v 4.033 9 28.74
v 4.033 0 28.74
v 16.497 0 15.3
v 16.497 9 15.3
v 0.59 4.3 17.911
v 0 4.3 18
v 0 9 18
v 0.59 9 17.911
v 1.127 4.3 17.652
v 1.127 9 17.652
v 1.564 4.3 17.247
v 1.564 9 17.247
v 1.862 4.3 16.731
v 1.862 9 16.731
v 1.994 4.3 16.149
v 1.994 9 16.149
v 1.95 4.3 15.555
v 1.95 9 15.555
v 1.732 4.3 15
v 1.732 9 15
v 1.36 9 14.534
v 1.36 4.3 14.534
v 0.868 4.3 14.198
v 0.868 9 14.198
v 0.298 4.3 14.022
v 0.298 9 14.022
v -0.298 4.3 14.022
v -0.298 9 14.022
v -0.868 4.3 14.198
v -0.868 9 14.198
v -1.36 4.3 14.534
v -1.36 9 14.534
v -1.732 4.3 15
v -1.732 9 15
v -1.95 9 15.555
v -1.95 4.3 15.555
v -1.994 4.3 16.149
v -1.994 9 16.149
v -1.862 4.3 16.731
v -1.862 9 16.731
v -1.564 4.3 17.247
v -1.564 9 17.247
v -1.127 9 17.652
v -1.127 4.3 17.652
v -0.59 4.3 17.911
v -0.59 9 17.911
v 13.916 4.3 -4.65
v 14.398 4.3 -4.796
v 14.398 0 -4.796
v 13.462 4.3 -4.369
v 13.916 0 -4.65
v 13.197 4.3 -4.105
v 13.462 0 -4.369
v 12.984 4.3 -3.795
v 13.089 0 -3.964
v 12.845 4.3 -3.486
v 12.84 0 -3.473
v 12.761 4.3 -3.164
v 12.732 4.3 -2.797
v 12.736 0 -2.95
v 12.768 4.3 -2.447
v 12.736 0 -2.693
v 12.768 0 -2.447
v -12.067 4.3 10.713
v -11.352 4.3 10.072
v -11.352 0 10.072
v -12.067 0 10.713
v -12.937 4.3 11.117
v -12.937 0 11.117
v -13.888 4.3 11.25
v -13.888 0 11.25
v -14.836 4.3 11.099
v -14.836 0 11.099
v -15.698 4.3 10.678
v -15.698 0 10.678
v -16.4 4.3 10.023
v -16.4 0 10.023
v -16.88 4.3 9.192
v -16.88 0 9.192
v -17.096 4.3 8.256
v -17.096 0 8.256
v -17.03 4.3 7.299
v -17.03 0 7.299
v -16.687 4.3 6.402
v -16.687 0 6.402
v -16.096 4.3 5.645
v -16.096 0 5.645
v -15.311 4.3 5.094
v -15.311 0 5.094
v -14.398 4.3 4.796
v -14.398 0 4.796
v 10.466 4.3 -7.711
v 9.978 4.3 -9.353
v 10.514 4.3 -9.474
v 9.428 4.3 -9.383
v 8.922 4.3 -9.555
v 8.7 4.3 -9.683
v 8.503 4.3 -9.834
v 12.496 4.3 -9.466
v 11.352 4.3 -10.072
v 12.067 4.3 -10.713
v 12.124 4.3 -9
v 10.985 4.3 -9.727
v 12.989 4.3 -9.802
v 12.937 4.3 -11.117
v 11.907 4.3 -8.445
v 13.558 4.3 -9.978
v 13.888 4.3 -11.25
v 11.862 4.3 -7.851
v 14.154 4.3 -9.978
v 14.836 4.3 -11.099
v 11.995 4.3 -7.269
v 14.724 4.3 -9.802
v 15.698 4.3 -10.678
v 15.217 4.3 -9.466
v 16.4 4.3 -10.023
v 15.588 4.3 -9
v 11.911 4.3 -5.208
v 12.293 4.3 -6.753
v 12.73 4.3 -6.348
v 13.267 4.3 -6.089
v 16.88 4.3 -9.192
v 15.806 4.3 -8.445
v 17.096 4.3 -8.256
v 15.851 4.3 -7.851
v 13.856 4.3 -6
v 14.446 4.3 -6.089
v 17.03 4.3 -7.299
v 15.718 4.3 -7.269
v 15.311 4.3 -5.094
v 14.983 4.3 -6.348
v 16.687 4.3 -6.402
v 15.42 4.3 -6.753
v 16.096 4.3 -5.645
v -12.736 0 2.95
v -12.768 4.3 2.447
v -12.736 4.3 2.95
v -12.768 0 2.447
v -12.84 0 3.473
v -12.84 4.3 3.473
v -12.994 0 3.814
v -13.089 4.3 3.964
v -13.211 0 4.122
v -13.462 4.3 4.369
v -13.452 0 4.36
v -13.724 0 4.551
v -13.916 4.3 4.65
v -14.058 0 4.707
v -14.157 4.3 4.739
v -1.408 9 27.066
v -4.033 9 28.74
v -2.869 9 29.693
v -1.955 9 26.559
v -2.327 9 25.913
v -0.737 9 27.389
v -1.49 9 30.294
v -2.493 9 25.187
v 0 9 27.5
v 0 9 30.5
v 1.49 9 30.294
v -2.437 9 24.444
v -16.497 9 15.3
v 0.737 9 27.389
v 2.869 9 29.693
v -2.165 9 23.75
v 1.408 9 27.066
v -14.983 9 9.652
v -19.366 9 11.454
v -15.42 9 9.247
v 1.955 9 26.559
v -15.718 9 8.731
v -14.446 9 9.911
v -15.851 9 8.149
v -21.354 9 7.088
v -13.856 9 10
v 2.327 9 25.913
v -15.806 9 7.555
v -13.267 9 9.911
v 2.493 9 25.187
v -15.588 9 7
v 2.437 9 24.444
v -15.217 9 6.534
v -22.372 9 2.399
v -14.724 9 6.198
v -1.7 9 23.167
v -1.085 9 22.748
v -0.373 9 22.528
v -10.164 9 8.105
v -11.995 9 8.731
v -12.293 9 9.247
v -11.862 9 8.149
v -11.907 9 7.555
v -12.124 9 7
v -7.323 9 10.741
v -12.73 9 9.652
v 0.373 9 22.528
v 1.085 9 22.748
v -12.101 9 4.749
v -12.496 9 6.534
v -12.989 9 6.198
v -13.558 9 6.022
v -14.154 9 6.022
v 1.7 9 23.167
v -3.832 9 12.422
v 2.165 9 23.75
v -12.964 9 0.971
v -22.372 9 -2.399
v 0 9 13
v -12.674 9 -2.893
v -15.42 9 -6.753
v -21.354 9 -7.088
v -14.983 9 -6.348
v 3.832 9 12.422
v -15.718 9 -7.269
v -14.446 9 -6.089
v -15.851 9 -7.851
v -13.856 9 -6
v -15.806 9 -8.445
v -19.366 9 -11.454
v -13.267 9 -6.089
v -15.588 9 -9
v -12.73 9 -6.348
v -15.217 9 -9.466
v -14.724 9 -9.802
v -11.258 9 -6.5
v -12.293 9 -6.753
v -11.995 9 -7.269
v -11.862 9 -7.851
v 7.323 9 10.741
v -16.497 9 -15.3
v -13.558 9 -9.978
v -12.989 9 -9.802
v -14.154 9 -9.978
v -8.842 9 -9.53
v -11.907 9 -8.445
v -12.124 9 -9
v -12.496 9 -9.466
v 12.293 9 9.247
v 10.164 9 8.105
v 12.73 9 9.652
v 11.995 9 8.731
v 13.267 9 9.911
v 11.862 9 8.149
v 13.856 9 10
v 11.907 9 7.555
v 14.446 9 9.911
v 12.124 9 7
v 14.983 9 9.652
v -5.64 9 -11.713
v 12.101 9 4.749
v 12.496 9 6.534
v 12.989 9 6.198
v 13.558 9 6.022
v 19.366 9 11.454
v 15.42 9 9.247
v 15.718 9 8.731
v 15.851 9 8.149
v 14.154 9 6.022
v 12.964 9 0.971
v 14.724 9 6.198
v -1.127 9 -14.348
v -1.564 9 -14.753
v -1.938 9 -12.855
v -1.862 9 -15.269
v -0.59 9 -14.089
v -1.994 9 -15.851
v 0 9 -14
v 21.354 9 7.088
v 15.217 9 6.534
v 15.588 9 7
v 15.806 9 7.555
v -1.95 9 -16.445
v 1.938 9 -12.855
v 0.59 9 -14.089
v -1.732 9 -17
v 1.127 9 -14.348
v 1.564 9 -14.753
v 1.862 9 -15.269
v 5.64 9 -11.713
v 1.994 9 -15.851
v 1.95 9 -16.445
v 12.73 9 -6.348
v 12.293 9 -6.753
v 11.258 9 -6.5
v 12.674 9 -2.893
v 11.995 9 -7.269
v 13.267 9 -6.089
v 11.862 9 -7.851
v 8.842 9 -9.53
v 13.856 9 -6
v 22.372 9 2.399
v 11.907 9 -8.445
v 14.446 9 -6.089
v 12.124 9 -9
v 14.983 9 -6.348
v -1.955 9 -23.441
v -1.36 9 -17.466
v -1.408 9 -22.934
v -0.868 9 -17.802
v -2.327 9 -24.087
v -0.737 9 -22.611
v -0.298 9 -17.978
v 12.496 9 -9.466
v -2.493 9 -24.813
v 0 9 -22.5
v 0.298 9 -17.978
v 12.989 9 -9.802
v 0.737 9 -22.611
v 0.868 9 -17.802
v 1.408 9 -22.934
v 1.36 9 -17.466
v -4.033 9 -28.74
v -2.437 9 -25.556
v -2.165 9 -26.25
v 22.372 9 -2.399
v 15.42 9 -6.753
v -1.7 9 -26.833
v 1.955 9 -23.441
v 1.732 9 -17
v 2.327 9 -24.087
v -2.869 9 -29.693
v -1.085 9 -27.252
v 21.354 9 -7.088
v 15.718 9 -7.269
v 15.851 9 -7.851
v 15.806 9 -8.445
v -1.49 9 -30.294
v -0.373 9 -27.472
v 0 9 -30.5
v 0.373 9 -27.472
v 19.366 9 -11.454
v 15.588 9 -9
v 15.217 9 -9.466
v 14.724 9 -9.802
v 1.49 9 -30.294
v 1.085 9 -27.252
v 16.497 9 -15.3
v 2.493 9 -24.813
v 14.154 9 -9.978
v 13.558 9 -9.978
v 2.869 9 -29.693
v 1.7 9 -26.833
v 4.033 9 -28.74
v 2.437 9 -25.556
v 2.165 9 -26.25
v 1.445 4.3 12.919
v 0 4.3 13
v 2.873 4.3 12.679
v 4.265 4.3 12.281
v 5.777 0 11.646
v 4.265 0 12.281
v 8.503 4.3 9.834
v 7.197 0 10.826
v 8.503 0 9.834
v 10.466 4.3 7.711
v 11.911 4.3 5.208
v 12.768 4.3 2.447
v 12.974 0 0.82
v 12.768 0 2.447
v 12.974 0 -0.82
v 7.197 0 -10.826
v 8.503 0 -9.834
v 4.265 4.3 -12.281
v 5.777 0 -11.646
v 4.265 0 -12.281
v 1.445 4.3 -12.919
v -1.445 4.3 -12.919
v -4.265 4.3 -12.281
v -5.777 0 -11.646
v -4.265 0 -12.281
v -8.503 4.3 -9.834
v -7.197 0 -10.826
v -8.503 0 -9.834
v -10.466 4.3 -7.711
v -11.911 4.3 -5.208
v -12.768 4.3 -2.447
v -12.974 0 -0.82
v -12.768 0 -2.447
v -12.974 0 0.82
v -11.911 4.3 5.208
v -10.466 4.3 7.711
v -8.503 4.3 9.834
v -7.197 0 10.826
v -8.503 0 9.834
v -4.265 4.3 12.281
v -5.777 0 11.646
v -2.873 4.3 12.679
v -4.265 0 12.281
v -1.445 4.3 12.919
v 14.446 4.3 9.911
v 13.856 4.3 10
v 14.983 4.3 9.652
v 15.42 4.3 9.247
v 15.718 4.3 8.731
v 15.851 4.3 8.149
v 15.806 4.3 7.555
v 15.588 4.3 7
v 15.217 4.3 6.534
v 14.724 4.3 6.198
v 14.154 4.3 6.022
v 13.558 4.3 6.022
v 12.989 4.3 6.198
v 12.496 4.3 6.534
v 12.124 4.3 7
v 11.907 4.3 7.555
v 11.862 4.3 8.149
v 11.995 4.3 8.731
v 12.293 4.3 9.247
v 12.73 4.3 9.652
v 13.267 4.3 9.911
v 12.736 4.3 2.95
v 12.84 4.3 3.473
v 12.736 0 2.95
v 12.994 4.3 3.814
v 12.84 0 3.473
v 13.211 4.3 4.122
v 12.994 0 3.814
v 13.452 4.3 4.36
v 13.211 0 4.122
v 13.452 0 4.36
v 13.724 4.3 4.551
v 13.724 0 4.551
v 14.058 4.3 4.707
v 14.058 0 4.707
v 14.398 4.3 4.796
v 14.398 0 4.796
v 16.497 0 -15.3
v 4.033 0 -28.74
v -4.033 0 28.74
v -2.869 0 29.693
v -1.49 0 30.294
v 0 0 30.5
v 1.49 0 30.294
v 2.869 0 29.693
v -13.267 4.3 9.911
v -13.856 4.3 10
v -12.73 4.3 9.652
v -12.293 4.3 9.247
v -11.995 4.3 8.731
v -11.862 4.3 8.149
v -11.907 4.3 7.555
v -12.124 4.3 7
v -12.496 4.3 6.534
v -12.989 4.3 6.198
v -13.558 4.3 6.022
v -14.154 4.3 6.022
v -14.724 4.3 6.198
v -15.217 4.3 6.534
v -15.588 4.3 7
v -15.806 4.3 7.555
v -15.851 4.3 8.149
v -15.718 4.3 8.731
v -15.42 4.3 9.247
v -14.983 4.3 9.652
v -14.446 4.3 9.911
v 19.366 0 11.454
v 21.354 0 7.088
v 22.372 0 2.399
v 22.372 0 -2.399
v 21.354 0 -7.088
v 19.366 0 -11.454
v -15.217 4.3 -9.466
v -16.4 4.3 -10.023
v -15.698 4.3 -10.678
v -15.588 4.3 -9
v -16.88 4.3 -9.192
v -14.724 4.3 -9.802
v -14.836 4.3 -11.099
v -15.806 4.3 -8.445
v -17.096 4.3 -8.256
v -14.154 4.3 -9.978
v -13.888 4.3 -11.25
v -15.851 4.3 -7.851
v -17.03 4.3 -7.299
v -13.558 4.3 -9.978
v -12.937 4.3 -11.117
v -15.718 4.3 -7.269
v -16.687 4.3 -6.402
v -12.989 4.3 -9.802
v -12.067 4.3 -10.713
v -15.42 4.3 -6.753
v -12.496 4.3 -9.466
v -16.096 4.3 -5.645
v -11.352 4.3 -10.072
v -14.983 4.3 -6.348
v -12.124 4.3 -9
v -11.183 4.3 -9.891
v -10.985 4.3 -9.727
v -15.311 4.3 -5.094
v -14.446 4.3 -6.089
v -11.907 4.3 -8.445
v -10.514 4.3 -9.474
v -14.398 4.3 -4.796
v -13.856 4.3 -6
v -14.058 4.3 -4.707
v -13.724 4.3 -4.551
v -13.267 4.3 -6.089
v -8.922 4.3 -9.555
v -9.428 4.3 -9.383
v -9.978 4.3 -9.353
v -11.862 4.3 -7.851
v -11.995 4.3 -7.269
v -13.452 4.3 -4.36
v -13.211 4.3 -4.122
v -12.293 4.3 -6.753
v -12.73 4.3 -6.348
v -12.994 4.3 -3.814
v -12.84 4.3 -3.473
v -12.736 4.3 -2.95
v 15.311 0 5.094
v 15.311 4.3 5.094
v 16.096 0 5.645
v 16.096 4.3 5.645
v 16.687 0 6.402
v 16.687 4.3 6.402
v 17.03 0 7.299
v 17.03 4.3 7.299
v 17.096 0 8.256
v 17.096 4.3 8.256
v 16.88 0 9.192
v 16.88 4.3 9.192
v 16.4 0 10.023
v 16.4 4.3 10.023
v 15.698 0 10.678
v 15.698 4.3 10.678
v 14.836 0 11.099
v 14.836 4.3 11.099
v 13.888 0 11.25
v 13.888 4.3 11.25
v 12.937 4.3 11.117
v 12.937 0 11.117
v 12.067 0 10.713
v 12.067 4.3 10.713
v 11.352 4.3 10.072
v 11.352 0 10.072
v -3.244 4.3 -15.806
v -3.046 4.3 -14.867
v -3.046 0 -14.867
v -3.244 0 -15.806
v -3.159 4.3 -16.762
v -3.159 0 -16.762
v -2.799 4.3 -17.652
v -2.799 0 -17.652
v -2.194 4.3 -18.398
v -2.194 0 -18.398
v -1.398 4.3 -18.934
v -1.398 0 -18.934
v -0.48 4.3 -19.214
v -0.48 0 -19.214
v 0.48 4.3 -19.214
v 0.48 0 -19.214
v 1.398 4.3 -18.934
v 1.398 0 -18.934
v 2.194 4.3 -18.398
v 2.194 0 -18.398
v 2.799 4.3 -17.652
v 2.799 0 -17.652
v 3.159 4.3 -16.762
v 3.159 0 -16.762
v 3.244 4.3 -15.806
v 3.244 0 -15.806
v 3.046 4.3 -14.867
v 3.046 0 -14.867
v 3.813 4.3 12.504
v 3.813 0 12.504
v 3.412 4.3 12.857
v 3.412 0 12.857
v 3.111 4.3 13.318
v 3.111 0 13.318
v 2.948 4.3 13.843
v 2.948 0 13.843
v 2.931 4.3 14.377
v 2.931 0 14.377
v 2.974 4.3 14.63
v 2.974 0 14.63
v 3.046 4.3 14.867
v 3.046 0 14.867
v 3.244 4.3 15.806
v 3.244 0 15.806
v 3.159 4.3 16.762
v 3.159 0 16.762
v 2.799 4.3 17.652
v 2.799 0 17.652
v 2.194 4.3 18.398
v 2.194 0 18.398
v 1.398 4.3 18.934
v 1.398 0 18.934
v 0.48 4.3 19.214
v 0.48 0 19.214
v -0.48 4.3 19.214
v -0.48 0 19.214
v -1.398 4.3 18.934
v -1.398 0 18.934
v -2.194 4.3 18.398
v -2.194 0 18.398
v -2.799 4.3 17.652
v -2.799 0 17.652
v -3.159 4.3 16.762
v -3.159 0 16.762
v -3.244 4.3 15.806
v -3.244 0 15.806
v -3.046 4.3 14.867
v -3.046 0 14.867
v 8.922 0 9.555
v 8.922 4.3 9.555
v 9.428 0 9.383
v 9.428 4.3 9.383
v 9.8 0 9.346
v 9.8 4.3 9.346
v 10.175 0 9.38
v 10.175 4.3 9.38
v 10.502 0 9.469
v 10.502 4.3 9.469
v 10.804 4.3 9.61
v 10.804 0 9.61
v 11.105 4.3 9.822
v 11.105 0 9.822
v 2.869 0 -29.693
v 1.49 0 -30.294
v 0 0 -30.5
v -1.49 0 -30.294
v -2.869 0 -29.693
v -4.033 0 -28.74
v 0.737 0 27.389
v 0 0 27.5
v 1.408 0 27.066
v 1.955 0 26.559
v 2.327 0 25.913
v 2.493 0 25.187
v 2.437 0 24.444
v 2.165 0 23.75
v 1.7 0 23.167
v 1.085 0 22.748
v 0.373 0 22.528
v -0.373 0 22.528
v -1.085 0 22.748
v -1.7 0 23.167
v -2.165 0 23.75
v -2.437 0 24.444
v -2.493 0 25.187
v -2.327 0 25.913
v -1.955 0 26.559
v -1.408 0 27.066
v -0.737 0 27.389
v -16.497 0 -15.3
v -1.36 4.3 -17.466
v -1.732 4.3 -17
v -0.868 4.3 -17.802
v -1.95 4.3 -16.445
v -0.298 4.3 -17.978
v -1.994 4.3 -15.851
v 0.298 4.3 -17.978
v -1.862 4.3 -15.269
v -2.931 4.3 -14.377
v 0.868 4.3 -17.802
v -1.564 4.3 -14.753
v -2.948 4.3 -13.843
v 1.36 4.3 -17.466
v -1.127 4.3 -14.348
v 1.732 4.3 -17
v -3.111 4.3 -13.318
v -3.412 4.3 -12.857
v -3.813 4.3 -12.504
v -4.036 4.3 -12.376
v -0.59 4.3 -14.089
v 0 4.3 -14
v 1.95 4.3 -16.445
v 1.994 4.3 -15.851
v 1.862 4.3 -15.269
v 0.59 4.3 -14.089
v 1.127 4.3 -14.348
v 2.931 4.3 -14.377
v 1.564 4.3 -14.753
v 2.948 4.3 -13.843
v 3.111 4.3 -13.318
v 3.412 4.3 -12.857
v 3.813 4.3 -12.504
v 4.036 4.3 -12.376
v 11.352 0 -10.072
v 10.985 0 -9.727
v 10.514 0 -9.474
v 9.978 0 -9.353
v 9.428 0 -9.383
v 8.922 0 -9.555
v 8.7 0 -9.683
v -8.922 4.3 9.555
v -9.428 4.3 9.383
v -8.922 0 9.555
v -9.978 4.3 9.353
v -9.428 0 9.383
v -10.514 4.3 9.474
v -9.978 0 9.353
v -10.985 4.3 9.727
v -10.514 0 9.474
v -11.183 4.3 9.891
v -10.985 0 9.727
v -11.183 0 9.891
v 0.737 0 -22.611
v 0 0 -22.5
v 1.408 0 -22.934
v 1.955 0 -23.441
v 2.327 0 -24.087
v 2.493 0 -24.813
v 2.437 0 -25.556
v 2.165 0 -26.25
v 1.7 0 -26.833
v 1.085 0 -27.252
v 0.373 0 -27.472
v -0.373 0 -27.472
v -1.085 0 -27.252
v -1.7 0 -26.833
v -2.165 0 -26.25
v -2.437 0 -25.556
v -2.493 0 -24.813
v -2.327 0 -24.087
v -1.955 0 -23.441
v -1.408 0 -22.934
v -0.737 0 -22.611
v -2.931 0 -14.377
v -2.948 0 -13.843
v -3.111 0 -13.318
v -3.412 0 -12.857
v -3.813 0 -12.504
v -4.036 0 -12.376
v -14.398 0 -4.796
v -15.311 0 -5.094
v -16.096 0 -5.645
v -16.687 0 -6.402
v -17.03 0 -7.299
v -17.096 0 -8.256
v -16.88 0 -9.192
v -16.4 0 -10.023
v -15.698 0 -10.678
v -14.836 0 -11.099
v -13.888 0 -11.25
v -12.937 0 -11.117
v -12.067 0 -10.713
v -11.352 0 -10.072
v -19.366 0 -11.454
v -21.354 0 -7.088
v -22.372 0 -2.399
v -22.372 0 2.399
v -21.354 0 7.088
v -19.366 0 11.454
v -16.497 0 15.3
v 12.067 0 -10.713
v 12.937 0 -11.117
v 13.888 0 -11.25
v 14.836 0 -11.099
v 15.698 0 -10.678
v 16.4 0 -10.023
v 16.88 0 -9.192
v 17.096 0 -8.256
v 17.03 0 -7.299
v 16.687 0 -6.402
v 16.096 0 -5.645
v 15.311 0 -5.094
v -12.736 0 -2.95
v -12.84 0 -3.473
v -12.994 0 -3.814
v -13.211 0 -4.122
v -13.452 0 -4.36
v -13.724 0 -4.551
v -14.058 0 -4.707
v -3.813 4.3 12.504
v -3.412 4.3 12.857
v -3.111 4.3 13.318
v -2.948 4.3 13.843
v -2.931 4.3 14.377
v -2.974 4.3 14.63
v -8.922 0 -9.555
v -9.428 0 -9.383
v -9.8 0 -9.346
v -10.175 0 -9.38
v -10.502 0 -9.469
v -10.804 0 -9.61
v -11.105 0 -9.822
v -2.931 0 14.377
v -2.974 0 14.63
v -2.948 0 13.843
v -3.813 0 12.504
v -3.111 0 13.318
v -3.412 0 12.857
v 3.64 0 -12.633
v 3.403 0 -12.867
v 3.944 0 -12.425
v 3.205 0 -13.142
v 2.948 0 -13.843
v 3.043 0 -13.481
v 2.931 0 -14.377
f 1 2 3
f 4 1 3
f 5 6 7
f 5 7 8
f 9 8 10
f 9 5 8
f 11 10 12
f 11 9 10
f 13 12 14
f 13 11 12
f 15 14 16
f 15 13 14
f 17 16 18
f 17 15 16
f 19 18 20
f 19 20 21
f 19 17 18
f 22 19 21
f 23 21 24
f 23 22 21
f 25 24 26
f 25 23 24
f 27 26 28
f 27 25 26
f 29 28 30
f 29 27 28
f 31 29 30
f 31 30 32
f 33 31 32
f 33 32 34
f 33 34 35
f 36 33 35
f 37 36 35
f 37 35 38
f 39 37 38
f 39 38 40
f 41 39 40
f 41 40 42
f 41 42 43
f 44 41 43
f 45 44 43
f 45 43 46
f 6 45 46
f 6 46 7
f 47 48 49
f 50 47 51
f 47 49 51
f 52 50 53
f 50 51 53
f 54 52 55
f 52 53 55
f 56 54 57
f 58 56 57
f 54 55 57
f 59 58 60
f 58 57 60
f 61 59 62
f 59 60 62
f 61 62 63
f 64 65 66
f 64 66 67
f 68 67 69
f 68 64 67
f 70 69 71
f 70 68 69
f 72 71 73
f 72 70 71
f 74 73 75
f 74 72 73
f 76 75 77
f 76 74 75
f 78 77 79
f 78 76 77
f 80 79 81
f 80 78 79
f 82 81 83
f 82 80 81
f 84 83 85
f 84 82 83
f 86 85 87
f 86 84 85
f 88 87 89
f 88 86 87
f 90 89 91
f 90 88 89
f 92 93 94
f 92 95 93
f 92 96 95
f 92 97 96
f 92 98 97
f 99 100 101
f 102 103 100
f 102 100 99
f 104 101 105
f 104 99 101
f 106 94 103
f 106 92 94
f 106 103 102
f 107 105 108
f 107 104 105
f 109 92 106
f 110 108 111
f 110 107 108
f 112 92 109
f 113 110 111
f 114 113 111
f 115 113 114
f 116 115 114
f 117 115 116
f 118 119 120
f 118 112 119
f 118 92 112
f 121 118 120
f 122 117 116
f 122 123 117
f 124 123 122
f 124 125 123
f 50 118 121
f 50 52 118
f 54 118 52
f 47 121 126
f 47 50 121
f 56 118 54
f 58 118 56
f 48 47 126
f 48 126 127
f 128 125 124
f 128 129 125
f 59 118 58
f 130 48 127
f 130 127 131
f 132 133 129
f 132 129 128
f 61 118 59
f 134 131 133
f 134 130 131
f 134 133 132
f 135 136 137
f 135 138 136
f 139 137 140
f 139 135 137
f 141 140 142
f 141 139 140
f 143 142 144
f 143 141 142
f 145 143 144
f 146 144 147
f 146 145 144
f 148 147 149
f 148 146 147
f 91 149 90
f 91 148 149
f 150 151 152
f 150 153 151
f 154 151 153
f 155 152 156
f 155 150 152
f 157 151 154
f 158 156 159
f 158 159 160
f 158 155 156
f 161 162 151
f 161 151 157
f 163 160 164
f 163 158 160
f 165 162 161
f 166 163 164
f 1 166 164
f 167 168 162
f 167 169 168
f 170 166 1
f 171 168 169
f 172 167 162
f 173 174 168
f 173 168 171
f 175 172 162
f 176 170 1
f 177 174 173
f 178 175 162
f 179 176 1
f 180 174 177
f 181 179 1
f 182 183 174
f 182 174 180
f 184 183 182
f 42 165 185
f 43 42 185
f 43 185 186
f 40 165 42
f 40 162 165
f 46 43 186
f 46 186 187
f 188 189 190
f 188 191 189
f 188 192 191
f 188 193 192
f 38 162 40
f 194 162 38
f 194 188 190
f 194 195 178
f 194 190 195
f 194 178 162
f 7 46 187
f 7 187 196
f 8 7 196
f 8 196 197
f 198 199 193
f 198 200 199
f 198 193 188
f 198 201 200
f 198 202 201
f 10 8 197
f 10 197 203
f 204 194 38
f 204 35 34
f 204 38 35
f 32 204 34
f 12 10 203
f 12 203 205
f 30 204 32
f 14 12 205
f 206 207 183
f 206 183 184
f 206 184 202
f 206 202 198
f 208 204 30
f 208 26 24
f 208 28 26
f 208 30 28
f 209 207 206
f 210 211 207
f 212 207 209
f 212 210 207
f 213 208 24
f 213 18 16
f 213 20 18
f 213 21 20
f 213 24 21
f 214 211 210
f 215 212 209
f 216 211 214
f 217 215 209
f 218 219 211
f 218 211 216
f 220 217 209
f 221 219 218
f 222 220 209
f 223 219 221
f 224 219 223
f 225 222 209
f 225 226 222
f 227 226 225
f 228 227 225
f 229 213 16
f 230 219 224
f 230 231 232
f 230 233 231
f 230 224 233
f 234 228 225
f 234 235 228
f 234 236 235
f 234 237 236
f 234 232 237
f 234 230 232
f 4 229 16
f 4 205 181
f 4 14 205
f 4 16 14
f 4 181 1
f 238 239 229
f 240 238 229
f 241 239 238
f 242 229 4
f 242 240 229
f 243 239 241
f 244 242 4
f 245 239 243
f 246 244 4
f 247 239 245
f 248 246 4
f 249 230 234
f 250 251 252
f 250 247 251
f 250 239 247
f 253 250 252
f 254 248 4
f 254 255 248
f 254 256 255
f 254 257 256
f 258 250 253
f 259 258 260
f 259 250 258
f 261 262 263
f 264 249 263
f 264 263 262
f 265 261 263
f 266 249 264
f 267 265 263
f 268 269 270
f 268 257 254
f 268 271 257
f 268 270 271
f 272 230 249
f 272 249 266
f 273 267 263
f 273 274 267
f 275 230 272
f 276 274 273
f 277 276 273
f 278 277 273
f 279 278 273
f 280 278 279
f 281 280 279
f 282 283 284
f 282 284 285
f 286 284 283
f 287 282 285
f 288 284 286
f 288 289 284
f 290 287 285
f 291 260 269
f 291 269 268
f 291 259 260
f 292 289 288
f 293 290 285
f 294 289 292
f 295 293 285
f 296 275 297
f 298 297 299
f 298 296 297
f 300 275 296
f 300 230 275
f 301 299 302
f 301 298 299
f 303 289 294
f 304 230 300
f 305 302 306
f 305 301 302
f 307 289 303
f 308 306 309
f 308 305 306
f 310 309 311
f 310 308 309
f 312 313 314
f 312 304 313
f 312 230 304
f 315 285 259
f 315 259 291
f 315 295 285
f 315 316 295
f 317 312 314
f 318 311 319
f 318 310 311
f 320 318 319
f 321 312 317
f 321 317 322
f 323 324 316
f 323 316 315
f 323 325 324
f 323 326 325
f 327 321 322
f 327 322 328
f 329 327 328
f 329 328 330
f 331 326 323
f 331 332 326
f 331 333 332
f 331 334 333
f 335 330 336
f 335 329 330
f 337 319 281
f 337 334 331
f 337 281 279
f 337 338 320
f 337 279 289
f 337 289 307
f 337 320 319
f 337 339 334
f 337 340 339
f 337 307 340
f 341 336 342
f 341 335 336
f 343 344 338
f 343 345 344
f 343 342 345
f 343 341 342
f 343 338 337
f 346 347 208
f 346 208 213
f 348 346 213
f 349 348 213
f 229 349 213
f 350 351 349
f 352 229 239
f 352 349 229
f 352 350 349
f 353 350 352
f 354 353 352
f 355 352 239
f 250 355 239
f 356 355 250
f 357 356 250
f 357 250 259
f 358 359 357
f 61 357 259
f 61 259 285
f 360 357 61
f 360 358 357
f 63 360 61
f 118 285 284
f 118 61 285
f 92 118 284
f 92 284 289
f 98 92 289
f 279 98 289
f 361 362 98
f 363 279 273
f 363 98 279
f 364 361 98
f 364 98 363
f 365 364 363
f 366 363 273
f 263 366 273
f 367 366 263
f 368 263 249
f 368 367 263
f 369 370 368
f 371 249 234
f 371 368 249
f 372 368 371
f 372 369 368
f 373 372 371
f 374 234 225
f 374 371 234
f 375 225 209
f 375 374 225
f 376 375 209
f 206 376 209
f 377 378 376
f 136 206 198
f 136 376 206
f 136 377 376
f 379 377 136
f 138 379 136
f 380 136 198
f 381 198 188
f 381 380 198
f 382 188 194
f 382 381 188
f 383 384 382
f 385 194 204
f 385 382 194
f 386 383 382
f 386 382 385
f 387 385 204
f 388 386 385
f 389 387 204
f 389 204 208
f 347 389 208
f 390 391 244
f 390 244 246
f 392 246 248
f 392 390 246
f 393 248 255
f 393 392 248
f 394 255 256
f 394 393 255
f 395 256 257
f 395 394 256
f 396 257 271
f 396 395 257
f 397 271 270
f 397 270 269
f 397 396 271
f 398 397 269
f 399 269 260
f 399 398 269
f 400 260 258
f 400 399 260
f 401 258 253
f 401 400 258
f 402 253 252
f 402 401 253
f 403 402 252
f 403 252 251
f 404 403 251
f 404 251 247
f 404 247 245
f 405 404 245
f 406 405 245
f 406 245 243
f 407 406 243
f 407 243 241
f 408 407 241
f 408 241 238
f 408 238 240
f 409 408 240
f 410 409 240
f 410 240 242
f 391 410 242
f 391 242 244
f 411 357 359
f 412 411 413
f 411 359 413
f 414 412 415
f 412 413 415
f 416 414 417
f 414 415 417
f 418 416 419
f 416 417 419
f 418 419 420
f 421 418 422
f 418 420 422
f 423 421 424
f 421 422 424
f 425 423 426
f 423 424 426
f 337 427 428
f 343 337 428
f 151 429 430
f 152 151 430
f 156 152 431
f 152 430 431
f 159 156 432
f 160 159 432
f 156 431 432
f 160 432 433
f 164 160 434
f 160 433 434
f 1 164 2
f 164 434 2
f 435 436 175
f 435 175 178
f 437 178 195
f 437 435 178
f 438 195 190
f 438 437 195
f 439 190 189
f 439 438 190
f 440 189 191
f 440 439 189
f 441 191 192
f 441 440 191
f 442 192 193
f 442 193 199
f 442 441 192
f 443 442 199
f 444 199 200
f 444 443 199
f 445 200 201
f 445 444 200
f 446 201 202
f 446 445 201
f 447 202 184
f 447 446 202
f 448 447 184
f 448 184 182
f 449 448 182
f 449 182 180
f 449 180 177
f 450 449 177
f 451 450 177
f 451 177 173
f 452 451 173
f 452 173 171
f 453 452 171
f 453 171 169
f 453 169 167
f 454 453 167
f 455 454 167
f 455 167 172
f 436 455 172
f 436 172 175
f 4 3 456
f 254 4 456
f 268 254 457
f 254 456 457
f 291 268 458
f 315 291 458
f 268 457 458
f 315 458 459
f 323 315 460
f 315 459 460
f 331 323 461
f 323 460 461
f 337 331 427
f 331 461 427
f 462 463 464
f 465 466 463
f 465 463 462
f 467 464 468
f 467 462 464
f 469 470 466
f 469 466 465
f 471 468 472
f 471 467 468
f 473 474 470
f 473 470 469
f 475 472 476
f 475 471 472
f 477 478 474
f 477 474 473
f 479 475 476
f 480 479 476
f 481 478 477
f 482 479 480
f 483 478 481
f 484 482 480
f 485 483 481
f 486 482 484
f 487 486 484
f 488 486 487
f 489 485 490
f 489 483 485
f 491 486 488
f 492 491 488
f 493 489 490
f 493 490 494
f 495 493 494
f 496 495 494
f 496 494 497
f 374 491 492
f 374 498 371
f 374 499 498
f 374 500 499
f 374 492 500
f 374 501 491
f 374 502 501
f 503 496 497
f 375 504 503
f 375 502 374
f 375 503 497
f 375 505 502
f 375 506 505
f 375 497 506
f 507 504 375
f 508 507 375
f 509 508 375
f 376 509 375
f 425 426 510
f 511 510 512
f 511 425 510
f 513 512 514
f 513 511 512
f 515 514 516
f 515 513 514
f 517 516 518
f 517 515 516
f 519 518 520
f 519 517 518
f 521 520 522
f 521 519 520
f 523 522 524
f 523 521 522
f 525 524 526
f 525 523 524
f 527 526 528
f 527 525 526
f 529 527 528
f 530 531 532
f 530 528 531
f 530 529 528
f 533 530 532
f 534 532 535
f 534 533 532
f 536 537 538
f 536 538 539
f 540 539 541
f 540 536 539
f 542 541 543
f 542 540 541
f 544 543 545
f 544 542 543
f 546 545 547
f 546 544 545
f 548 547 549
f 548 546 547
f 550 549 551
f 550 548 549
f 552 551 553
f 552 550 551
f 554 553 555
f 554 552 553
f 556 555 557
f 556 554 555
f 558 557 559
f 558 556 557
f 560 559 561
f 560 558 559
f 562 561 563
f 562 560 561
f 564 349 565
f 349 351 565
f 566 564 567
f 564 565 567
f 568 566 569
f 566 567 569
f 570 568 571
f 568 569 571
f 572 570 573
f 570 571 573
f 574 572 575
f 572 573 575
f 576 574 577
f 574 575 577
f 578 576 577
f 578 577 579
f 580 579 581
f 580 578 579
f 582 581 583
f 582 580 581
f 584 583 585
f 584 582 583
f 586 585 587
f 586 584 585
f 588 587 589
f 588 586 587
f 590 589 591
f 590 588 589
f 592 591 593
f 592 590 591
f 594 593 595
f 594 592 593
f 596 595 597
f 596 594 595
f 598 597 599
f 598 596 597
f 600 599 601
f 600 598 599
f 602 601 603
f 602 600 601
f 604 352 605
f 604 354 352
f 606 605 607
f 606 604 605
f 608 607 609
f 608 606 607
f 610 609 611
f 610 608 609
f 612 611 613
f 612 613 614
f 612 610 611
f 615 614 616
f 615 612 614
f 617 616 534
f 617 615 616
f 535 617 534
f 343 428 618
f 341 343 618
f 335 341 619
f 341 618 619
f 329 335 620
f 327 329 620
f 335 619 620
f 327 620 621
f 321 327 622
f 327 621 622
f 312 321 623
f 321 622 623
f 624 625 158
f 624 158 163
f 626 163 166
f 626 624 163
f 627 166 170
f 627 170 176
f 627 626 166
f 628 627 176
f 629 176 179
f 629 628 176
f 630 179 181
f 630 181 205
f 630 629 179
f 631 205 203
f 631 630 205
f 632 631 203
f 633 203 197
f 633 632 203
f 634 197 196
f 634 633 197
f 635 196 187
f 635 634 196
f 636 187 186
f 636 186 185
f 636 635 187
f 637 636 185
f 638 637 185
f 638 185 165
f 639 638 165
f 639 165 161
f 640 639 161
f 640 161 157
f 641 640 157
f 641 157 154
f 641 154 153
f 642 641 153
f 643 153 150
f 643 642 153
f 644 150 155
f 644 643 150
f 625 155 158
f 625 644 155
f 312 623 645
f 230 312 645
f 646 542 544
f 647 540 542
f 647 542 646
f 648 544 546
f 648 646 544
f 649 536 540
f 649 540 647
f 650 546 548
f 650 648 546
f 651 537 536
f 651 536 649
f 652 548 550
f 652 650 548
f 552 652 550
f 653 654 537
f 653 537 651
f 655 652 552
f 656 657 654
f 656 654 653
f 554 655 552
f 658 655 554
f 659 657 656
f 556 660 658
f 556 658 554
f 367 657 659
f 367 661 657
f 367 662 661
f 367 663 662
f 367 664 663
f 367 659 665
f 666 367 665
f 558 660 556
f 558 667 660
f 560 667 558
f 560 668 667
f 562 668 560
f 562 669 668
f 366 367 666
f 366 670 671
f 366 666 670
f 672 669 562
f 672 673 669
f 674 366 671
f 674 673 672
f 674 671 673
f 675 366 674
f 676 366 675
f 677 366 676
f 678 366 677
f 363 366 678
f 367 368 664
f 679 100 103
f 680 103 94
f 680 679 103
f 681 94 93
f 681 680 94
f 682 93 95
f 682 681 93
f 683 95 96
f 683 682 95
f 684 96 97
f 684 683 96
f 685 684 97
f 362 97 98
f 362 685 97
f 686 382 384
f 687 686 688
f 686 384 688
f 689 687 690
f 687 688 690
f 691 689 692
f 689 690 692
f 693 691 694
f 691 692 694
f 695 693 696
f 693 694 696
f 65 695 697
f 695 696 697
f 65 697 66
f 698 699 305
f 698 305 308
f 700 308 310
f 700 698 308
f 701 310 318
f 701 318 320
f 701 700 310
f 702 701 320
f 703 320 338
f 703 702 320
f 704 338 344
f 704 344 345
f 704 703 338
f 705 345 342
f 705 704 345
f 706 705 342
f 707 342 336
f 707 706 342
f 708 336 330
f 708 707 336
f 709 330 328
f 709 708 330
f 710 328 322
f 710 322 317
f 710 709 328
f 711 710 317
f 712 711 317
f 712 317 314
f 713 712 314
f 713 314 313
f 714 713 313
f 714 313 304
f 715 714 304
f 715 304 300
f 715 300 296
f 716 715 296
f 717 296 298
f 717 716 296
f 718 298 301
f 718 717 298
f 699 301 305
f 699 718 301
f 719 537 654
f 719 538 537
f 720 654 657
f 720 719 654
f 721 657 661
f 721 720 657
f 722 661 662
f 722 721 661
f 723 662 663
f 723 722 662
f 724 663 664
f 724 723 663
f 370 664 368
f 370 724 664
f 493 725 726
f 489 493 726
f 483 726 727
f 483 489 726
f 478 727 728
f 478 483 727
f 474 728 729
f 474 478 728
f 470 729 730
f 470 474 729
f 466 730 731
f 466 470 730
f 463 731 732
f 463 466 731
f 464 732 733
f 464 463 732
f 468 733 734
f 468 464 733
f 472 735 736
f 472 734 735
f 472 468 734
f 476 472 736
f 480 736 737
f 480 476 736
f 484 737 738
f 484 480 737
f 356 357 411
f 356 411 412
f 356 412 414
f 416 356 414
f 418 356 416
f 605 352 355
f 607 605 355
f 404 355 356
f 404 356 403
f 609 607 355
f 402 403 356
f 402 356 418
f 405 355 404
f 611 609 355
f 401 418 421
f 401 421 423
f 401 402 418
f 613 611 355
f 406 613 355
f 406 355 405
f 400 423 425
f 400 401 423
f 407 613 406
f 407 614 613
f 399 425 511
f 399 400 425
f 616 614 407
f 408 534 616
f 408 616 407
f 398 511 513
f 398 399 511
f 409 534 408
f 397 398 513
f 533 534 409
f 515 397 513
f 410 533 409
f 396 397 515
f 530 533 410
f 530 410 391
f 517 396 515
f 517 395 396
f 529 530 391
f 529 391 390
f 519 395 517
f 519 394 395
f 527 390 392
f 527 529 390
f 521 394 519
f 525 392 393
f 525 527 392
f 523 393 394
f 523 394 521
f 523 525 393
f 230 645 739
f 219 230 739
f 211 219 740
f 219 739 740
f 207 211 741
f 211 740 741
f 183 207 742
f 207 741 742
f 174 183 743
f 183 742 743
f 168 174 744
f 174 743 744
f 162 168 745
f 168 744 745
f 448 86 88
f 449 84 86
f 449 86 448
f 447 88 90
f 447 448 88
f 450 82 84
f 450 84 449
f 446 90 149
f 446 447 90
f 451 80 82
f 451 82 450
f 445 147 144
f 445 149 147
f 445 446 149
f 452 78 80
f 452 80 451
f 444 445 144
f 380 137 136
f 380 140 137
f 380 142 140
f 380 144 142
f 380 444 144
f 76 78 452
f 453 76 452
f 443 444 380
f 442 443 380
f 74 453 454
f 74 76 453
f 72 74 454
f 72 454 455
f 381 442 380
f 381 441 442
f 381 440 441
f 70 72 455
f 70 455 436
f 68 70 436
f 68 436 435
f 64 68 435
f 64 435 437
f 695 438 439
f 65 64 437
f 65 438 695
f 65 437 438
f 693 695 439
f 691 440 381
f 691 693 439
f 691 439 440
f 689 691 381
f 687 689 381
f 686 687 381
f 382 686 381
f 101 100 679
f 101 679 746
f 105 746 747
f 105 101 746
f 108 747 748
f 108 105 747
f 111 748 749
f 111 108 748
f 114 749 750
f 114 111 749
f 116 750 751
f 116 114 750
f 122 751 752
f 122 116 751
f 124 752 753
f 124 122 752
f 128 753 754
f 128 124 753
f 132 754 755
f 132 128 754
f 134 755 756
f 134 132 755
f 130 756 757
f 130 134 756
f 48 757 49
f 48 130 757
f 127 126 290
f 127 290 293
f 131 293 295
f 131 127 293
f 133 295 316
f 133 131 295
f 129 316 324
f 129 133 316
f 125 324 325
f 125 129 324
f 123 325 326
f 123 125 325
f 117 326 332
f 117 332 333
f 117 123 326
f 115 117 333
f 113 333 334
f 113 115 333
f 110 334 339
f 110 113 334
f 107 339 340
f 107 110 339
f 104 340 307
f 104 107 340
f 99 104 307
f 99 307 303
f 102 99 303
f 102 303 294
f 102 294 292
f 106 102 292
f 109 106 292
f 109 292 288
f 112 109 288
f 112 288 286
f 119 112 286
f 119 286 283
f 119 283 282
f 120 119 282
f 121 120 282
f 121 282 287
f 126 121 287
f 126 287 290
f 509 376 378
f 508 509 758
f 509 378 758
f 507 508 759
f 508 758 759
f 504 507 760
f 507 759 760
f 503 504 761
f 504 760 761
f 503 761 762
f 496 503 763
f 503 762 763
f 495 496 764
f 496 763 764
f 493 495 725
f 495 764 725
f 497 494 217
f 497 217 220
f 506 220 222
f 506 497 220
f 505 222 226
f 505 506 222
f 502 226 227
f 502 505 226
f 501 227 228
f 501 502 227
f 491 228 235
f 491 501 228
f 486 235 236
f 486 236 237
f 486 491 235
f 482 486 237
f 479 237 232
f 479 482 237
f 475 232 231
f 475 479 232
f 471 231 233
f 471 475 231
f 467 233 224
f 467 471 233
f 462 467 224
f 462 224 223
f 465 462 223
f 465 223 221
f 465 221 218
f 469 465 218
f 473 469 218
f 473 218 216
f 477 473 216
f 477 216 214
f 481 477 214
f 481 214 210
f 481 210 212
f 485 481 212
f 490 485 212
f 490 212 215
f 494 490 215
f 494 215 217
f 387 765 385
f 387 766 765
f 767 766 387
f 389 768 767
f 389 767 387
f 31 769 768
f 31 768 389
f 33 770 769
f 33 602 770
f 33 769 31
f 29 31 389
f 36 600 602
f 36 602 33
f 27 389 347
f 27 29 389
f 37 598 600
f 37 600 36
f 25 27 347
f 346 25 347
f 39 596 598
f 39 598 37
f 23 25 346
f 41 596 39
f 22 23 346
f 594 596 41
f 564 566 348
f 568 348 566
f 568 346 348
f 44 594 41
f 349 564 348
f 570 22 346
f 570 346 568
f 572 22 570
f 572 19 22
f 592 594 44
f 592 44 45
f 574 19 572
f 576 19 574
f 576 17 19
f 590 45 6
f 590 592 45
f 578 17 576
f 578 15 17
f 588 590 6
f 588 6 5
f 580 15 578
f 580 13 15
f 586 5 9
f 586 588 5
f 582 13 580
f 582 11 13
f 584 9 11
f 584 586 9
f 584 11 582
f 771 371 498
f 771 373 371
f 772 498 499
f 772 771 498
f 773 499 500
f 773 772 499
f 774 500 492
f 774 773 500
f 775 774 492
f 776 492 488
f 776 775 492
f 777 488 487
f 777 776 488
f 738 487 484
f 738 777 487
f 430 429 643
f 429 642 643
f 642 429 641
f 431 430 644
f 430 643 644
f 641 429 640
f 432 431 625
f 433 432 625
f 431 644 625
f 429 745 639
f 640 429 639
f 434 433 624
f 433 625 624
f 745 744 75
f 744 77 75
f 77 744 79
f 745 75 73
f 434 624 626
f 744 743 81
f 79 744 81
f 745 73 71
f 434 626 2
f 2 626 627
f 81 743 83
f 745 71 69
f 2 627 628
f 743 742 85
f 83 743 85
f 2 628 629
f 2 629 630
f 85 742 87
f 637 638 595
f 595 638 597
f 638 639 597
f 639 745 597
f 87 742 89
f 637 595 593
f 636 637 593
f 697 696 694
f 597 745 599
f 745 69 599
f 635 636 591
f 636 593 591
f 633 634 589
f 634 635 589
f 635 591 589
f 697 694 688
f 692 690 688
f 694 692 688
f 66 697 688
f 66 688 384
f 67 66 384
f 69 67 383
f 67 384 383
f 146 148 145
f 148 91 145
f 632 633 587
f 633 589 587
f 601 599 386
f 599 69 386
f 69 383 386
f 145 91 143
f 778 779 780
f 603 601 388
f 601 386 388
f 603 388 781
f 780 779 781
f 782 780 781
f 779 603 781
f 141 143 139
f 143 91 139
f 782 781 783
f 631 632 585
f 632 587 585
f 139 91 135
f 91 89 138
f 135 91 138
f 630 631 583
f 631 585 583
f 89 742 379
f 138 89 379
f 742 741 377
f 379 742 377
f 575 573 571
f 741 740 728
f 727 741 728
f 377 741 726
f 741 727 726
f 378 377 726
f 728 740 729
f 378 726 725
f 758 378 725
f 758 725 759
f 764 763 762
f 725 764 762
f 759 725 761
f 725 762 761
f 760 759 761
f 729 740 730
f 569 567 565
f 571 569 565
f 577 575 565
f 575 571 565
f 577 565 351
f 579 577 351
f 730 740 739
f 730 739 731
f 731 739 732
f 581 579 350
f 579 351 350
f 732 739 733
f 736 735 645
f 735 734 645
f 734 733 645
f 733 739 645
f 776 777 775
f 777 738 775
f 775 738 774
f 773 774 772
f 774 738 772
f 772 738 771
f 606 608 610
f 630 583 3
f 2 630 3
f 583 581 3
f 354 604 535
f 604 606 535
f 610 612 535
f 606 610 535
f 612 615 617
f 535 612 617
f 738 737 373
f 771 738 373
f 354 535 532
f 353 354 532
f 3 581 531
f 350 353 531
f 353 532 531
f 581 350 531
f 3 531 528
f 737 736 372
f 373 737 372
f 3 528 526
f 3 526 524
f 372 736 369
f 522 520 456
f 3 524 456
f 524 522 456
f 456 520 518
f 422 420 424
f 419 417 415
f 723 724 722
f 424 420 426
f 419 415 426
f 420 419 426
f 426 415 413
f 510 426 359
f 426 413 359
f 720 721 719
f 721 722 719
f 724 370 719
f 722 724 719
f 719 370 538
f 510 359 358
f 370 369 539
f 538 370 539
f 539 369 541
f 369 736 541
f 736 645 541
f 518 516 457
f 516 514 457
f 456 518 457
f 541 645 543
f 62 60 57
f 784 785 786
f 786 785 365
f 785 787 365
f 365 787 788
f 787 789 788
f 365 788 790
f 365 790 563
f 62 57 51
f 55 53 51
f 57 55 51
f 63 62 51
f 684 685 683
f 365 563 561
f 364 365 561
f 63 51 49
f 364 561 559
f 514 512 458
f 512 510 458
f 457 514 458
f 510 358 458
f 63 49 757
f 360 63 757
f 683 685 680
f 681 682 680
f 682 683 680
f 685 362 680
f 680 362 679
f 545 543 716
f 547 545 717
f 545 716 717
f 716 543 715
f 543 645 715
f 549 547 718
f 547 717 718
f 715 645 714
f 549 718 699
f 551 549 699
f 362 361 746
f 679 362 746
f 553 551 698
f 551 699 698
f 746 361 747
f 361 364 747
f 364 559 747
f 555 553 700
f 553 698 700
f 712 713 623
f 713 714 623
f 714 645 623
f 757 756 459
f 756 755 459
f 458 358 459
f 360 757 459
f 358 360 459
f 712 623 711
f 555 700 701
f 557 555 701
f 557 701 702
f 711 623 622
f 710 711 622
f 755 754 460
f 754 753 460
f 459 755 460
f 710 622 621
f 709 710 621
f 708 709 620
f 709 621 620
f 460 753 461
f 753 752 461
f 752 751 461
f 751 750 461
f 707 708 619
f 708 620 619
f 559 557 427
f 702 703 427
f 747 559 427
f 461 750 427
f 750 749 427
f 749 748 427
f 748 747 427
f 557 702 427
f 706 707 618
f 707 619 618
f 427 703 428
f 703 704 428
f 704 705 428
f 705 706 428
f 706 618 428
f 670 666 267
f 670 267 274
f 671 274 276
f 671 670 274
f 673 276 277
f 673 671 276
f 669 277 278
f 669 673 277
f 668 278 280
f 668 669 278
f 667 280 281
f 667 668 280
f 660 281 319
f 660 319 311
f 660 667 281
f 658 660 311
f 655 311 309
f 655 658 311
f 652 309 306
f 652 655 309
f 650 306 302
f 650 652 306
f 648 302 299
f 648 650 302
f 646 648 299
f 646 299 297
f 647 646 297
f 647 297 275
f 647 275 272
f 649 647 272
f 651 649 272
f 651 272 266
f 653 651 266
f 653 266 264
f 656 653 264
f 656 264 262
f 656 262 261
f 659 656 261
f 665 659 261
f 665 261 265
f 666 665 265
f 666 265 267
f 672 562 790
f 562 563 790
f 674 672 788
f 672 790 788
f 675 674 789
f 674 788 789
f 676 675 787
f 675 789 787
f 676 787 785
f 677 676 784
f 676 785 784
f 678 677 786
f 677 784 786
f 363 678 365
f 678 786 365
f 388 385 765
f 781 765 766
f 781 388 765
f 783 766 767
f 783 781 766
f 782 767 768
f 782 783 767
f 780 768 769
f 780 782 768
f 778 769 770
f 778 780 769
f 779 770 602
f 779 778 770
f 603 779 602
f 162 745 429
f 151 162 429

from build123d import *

# Parameters (mm, degrees)
SKETCH1_R           = 13
SKETCH1_R_2         = 2
SKETCH1_R_3         = 2.5
BOSS_EXTRUDE1_DEPTH = 9
CUT_EXTRUDE2_START  = -4.3
SKETCH3_R           = 3.25
CUT_EXTRUDE2_DEPTH  = 4.3
FILLET1_R           = 2


with BuildPart() as part:
    # Sketch1 → Boss-Extrude1 (new body)
    with BuildSketch(Plane(origin=(0, 0, 0), x_dir=(1, 0, 0), z_dir=(0, 1, 0))):
        with BuildLine():
            Line((-4.032667043, 28.739999939), (-16.497272732, 15.299999752))
            ThreePointArc((-16.497272732, 15.299999752), (-22.5, 0), (-16.497272732, -15.299999752))
            Line((-16.497272732, -15.299999752), (-4.032667043, -28.739999939))
            ThreePointArc((-4.032667043, -28.739999939), (-3.38e-07, -30.499999725), (4.03266618, -28.740000061))
            Line((4.03266618, -28.740000061), (16.497272272, -15.300000248))
            ThreePointArc((16.497272272, -15.300000248), (22.5, 0), (16.497272272, 15.300000248))
            Line((16.497272272, 15.300000248), (4.03266618, 28.740000061))
            ThreePointArc((4.03266618, 28.740000061), (-4.58e-07, 30.5), (-4.032667043, 28.739999939))
        make_face()
        with Locations(Location((0, 0, 0), (0, 0, 270))):
            Circle(SKETCH1_R, mode=Mode.SUBTRACT)
        with Locations(Location((0, 16, 0), (0, 0, 270))):
            Circle(SKETCH1_R_2, mode=Mode.SUBTRACT)
        with Locations(Location((13.856406461, 8, 0), (0, 0, 270))):
            Circle(SKETCH1_R_2, mode=Mode.SUBTRACT)
        with Locations(Location((13.856406461, -8, 0), (0, 0, 270))):
            Circle(SKETCH1_R_2, mode=Mode.SUBTRACT)
        with Locations(Location((0, -16, 0), (0, 0, 270))):
            Circle(SKETCH1_R_2, mode=Mode.SUBTRACT)
        with Locations(Location((-13.856406461, -8, 0), (0, 0, 270))):
            Circle(SKETCH1_R_2, mode=Mode.SUBTRACT)
        with Locations(Location((-13.856406461, 8, 0), (0, 0, 270))):
            Circle(SKETCH1_R_2, mode=Mode.SUBTRACT)
        with Locations(Location((-3.76e-07, 25, 0), (0, 0, 270))):
            Circle(SKETCH1_R_3, mode=Mode.SUBTRACT)
        with Locations(Location((0, -25, 0), (0, 0, 270))):
            Circle(SKETCH1_R_3, mode=Mode.SUBTRACT)
    extrude(amount=BOSS_EXTRUDE1_DEPTH)

    # Sketch3 → Cut-Extrude2 (cut)
    with BuildSketch(Plane.XZ.offset(CUT_EXTRUDE2_START)):
        with Locations((0, -16)):
            Circle(SKETCH3_R)
        with Locations((-13.856406461, -8)):
            Circle(SKETCH3_R)
        with Locations((-13.856406461, 8)):
            Circle(SKETCH3_R)
        with Locations((0, 16)):
            Circle(SKETCH3_R)
        with Locations((13.856406461, 8)):
            Circle(SKETCH3_R)
        with Locations((13.856406461, -8)):
            Circle(SKETCH3_R)
    extrude(amount=CUT_EXTRUDE2_DEPTH, mode=Mode.SUBTRACT)

    # Fillet1
    fillet1_edges = [part.edges().sort_by_distance(p)[0] for p in [
        (-11.778881987, 2.15, -5.500721691),
        (-10.653205718, 2.15, -7.450450184),
        (-10.653205718, 2.15, 7.450450184),
        (-11.778881987, 2.15, 5.500721691),
        (1.12567627, 2.15, 12.951171875),
        (-1.12567627, 2.15, 12.951171875),
        (11.778881987, 2.15, 5.500721691),
        (10.653205718, 2.15, 7.450450184),
        (10.653205718, 2.15, -7.450450184),
        (11.778881987, 2.15, -5.500721691),
        (-1.12567627, 2.15, -12.951171875),
        (1.12567627, 2.15, -12.951171875),
    ]]
    fillet(fillet1_edges, radius=FILLET1_R)


solid = part.part
